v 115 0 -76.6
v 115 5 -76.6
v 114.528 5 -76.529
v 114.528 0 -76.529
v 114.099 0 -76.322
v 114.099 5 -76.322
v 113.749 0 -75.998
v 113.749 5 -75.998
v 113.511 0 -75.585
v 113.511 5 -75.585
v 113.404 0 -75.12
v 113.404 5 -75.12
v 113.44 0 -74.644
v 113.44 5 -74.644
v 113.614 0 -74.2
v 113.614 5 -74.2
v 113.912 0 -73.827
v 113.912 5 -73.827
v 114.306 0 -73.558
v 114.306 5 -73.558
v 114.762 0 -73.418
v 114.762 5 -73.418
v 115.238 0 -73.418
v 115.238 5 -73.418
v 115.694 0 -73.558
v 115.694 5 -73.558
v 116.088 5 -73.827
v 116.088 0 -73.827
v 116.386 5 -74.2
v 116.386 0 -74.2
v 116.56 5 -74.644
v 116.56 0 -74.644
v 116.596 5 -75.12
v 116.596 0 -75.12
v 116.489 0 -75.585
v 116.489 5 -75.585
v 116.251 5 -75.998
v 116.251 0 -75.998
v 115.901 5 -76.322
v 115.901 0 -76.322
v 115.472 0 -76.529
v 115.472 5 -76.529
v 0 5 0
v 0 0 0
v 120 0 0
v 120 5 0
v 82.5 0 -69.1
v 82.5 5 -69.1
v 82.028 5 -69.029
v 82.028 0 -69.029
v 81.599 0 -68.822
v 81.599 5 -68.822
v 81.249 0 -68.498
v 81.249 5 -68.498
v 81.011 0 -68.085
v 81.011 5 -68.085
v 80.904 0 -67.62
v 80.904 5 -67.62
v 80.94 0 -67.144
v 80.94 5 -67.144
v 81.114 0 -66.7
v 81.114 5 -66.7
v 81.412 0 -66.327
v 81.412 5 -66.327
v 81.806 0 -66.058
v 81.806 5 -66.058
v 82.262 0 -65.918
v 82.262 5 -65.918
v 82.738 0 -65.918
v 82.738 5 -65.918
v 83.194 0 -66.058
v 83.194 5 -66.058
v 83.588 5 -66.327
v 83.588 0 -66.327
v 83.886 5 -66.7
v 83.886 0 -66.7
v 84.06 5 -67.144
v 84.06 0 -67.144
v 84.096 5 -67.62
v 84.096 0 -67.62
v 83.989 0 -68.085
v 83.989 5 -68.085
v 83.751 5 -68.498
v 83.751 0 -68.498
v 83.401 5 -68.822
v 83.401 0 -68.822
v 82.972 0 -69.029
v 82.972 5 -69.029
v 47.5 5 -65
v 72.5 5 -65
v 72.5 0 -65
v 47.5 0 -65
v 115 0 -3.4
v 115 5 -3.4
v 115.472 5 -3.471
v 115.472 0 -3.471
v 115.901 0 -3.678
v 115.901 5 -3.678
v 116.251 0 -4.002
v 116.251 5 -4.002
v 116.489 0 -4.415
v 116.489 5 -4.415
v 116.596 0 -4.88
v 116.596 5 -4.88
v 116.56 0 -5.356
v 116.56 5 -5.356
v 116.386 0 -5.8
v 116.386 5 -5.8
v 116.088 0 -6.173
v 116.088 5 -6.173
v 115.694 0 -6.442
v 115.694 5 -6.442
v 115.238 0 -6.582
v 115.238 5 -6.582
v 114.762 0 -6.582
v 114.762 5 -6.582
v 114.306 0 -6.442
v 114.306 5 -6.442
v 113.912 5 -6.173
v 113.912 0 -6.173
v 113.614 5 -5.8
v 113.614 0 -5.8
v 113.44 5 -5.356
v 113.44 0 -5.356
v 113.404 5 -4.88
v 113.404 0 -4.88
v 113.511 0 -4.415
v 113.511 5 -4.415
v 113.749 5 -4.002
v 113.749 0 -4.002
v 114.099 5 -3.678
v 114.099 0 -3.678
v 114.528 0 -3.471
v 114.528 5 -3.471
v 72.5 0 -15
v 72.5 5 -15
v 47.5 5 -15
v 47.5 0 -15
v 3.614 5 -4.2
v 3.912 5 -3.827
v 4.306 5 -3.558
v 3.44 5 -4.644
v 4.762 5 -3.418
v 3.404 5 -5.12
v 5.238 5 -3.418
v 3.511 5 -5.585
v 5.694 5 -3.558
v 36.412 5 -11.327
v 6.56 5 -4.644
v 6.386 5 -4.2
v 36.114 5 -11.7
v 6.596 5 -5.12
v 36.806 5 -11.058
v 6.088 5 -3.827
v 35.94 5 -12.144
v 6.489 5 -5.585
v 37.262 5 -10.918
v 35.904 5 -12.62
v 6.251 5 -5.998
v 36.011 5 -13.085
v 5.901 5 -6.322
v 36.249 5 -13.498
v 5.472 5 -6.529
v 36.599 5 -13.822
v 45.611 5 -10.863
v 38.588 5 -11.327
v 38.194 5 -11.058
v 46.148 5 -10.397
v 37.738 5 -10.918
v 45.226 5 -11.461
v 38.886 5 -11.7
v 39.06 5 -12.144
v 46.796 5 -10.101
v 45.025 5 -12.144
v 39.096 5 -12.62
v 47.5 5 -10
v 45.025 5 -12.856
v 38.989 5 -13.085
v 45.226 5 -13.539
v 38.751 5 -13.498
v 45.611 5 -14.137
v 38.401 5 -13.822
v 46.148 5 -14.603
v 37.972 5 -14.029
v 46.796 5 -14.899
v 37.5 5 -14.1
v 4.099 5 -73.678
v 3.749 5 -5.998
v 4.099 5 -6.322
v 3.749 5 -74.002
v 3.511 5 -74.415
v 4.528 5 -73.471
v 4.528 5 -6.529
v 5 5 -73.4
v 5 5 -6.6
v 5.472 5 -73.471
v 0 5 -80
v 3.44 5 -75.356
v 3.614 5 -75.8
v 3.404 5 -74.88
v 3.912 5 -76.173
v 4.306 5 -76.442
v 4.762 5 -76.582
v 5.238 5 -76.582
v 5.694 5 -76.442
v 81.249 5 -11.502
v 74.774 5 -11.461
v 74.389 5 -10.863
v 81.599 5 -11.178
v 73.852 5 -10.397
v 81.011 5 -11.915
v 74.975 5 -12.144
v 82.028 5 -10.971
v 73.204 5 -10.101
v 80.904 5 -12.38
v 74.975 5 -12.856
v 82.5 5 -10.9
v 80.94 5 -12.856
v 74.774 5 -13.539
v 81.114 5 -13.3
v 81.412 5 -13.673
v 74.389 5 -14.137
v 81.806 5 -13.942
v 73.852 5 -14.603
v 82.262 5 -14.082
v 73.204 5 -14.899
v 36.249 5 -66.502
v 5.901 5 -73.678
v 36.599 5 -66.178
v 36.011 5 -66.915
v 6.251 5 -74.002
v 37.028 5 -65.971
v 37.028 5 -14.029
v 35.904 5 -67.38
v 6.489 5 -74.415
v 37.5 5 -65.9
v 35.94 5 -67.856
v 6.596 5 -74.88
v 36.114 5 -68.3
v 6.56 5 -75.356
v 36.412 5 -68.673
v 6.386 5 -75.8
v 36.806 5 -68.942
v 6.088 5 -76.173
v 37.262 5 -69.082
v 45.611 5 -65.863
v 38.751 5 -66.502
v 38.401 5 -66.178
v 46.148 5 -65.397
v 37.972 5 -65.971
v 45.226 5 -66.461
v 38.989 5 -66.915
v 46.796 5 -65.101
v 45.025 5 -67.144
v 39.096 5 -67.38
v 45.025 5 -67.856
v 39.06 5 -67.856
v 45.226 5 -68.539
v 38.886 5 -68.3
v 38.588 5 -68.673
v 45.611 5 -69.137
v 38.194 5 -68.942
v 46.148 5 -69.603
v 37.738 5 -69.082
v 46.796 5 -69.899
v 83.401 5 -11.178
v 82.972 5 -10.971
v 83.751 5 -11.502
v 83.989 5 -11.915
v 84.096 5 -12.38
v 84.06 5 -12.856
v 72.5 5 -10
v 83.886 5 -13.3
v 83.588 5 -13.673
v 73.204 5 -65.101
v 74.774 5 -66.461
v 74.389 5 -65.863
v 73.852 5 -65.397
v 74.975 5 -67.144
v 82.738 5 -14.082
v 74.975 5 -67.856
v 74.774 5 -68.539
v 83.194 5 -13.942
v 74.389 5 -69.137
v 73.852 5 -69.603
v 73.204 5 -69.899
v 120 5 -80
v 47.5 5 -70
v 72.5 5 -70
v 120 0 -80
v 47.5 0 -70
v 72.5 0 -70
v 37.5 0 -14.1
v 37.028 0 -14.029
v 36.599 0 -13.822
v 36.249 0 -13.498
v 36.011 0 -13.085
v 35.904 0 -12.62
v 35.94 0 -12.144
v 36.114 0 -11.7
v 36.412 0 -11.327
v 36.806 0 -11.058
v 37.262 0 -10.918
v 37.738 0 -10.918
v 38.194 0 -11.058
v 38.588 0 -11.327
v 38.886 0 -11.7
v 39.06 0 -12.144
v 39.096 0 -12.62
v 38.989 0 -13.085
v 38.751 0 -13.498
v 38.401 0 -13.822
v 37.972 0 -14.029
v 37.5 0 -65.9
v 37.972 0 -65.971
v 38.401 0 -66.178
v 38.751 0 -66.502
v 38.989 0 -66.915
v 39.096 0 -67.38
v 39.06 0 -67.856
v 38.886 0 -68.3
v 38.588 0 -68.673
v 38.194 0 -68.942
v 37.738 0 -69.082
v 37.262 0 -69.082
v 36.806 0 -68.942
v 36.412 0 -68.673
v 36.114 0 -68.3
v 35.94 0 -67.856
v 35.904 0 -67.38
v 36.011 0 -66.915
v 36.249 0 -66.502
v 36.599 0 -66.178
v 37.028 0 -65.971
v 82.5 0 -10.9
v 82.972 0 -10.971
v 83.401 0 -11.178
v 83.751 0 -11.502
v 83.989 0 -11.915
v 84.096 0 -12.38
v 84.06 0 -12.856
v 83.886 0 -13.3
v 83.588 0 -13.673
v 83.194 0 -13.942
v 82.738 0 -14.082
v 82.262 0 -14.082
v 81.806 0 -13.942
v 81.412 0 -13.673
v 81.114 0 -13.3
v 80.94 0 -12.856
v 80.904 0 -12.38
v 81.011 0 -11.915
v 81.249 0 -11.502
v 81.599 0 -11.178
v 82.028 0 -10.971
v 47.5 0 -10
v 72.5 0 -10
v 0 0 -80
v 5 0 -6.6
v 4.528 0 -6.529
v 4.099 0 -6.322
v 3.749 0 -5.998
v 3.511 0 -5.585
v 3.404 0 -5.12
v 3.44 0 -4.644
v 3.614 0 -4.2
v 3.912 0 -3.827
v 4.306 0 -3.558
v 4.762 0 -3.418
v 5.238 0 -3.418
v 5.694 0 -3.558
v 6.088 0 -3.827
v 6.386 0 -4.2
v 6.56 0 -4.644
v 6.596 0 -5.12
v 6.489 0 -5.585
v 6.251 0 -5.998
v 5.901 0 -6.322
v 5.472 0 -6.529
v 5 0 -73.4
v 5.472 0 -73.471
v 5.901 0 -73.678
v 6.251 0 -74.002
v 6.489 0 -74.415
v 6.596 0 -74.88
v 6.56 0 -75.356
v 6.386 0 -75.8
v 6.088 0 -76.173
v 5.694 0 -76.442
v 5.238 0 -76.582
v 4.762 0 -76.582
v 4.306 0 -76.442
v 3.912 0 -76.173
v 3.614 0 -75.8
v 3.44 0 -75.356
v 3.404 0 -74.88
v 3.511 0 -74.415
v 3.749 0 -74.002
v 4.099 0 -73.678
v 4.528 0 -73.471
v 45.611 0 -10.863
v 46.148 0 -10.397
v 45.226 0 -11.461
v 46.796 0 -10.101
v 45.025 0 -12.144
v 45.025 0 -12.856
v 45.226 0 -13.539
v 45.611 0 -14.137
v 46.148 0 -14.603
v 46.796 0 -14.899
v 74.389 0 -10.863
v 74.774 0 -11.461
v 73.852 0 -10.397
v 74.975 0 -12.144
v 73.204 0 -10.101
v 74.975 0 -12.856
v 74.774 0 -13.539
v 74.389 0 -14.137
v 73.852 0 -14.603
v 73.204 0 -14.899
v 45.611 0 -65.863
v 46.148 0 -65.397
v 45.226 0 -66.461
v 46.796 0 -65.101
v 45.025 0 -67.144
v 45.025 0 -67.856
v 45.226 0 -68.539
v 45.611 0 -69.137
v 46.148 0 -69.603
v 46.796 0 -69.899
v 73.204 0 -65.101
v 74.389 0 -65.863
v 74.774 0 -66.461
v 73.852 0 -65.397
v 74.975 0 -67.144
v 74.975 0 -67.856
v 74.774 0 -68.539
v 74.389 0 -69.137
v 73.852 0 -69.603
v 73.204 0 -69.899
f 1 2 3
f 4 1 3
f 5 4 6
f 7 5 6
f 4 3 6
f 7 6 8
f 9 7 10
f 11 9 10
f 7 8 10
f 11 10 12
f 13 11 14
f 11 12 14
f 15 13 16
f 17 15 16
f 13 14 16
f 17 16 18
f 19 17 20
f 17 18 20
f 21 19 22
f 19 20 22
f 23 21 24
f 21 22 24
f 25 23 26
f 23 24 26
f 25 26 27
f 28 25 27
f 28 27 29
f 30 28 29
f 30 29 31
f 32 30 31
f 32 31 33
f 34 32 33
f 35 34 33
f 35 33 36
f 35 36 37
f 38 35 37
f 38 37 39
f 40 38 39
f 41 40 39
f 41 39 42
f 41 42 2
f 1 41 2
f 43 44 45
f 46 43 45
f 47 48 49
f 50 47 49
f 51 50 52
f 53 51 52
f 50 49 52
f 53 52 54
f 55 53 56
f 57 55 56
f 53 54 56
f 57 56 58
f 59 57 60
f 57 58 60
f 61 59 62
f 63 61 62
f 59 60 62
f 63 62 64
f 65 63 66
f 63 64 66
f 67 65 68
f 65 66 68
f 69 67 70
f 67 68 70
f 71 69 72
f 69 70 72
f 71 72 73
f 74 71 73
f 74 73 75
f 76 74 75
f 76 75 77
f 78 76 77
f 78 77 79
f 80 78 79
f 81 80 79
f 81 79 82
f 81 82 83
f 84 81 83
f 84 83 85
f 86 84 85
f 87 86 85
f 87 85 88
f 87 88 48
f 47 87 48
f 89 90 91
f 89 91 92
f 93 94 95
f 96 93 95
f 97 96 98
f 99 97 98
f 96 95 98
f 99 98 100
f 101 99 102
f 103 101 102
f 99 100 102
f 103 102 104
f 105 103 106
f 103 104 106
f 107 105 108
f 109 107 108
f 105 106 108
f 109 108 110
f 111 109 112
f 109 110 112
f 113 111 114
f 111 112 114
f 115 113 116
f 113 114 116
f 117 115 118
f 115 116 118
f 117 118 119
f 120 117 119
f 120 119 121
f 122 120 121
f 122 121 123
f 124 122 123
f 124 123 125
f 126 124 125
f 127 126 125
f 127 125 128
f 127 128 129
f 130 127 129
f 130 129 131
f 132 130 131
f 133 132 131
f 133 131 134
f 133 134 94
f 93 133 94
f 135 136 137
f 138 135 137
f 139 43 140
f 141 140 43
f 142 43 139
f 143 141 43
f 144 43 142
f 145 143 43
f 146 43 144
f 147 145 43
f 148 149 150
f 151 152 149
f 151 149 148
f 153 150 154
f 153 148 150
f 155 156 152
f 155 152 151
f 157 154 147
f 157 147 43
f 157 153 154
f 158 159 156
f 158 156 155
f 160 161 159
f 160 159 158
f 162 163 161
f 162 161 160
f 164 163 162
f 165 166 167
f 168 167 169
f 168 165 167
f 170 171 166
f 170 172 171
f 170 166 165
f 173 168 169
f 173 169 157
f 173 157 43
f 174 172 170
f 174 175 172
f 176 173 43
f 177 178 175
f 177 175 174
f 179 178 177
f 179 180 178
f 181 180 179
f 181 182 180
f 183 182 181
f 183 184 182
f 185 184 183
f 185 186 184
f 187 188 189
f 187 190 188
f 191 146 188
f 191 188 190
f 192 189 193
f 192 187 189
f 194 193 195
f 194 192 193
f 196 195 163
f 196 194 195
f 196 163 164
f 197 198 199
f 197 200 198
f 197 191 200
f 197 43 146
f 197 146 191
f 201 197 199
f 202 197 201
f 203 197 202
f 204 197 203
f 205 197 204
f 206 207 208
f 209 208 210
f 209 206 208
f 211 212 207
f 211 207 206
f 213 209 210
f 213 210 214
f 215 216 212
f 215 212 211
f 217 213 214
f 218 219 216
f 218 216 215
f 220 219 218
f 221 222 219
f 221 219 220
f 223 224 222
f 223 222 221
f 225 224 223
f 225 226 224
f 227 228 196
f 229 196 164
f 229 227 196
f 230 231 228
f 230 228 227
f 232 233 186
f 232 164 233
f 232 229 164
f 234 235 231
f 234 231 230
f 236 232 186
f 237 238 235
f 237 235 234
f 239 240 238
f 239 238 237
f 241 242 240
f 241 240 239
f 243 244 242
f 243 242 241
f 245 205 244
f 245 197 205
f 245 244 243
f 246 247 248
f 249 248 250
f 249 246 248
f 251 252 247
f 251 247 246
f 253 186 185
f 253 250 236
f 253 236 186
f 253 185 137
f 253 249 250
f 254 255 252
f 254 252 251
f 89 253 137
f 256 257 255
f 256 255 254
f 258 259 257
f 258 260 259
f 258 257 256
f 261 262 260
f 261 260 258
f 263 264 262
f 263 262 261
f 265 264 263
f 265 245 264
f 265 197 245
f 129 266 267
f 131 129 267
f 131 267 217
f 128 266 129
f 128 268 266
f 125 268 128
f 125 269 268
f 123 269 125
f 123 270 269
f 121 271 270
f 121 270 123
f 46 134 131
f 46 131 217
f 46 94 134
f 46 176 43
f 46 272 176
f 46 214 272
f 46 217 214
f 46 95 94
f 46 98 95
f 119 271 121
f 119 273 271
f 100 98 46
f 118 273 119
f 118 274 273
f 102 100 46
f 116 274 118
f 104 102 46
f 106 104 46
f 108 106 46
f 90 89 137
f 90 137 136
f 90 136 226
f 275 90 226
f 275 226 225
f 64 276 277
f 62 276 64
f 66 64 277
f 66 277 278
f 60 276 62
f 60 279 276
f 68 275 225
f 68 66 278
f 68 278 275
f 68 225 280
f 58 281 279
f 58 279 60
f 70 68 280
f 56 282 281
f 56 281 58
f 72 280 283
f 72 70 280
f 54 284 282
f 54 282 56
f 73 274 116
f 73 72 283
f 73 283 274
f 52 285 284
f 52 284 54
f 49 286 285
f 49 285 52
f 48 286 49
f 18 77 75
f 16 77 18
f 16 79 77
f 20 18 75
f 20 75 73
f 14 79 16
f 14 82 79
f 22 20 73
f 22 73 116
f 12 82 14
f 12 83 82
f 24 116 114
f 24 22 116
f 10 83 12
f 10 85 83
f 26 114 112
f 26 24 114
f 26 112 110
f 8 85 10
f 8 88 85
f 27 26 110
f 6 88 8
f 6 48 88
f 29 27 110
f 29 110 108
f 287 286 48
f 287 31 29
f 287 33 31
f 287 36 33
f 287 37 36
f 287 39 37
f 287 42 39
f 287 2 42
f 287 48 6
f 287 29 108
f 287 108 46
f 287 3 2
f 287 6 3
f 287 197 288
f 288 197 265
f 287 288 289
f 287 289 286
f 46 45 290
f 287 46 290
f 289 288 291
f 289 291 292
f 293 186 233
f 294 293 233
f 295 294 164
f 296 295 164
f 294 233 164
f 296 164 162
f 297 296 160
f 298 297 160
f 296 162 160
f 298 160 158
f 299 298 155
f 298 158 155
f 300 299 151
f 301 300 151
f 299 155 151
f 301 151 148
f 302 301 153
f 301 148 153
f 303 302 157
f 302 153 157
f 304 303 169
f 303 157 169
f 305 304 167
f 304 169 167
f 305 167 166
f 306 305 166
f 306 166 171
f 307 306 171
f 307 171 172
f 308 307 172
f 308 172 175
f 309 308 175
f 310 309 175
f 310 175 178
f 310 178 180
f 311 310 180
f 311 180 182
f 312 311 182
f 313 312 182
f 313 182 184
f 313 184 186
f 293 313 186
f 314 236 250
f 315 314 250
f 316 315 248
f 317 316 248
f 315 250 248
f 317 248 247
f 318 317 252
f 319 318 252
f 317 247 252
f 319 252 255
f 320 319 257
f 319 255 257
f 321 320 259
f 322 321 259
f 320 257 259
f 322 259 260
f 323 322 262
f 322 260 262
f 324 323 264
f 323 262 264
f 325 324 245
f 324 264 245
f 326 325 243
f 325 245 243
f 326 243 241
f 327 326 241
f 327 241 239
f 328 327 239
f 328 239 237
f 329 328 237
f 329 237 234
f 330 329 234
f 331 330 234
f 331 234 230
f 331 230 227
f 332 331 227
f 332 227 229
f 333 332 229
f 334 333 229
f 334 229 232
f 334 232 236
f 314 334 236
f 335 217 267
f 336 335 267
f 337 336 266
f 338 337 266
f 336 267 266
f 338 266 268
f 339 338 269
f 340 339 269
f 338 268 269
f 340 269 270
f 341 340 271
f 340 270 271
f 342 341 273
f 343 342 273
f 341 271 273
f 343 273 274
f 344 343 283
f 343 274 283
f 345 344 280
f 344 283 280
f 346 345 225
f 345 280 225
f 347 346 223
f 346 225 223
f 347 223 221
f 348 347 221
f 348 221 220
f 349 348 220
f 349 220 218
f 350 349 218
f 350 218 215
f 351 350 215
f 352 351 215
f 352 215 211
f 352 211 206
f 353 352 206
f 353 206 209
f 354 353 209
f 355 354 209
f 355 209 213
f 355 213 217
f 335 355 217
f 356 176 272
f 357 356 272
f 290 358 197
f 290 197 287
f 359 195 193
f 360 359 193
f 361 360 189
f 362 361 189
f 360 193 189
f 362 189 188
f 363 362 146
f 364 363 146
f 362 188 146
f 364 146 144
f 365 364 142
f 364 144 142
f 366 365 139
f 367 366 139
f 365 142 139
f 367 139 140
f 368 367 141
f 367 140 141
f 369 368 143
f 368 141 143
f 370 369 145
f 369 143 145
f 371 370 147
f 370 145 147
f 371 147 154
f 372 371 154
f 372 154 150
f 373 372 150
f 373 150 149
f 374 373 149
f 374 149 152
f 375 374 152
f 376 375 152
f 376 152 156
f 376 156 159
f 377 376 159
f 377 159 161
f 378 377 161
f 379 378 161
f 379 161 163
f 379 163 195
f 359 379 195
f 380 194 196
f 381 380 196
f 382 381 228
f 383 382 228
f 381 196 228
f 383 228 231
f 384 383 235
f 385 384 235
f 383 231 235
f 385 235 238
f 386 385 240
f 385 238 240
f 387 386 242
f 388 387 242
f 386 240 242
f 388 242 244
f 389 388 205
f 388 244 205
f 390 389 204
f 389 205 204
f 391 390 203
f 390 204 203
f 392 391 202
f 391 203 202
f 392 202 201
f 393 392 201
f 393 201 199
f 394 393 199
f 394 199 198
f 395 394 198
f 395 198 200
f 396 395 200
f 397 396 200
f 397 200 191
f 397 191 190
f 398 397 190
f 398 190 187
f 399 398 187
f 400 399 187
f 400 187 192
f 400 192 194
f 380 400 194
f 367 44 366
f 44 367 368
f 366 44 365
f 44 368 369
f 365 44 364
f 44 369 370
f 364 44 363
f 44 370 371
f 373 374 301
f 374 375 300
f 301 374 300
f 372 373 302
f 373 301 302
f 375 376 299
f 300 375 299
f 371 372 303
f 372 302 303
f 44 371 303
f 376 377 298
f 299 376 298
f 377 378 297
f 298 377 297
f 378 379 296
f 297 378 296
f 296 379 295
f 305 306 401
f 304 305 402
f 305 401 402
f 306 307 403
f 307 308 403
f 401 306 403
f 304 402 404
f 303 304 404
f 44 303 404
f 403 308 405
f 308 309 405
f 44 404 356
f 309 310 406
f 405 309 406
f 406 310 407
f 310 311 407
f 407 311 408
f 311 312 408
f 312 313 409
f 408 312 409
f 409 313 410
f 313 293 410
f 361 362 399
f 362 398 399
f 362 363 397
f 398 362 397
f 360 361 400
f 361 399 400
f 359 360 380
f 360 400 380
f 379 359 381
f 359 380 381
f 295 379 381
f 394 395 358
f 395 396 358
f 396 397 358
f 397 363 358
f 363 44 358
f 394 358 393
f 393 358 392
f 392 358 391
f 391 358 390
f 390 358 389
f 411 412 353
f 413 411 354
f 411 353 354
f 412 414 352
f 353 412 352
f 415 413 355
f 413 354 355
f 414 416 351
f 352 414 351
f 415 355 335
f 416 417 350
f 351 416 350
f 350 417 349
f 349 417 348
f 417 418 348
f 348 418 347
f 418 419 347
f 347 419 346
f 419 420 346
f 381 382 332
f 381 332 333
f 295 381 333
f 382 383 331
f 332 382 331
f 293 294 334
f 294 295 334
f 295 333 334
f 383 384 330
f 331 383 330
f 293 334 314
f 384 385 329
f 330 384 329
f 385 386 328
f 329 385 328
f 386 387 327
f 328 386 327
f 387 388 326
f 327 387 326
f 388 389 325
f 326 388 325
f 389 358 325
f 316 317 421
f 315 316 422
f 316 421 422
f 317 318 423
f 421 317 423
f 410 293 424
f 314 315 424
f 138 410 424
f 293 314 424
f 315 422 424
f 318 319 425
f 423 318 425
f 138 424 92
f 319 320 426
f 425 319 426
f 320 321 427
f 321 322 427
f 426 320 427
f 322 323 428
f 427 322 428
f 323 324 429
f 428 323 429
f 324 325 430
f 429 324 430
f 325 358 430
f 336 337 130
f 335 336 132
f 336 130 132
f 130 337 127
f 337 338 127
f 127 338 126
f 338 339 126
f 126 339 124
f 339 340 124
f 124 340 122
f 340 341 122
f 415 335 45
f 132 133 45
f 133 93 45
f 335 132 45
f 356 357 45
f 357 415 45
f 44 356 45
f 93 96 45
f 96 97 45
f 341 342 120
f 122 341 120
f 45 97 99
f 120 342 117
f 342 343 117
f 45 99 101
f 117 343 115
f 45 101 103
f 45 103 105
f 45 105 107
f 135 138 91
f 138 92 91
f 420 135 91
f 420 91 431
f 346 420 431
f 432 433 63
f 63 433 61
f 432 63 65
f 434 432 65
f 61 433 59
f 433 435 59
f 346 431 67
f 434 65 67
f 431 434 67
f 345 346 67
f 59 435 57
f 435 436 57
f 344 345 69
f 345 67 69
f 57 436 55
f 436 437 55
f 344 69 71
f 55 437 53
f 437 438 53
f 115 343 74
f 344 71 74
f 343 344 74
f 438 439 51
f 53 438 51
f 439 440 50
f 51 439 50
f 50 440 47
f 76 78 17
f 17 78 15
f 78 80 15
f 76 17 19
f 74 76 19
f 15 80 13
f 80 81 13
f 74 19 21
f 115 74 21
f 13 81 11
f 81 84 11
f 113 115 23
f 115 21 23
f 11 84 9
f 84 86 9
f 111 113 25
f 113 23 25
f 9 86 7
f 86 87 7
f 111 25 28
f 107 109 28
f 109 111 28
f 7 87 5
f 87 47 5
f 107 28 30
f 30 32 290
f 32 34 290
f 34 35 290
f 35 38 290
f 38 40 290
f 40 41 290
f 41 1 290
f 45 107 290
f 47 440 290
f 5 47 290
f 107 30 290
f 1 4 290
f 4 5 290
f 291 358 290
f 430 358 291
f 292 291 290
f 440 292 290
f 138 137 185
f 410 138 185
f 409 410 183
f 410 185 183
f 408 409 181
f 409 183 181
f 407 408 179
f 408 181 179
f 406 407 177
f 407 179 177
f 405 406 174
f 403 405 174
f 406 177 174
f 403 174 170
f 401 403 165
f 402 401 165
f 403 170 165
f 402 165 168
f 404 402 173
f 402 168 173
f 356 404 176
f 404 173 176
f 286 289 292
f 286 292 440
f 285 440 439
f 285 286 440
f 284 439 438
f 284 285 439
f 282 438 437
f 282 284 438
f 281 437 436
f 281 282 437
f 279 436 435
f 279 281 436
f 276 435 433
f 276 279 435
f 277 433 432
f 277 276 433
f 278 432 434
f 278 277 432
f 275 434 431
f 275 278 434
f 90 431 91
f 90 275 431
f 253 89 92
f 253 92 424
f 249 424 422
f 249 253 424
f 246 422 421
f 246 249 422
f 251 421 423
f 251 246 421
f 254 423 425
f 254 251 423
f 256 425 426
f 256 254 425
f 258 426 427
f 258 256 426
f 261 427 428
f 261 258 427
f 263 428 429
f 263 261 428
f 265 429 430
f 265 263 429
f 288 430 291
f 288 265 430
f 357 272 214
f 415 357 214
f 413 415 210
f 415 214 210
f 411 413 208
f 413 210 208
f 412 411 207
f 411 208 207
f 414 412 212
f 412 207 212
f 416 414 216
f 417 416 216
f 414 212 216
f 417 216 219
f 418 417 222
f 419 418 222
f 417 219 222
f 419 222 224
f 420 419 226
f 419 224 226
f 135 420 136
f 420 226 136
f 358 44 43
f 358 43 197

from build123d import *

# Parameters (mm, degrees)
ESQUISSE1_W             = 120
ESQUISSE1_H             = 80
BOSS_EXTRU_1_DEPTH      = 5
ESQUISSE2_R             = 1.6
ENL_V_MAT_EXTRU_1_DEPTH = 145.308696897


with BuildPart() as part:
    # Esquisse1 → Boss.-Extru.1 (new body)
    with BuildSketch(Plane(origin=(0, 0, 0), x_dir=(1, 0, 0), z_dir=(0, 1, 0))):
        with Locations((60, 40)):
            Rectangle(ESQUISSE1_W, ESQUISSE1_H)
    extrude(amount=BOSS_EXTRU_1_DEPTH)

    # Esquisse2 → Enlèv. mat.-Extru.1 (cut, through all)
    with BuildSketch(Plane(origin=(0, 5, 0), x_dir=(1, 0, 0), z_dir=(0, 1, 0))):
        with Locations(Location((37.5, 67.5, 0), (0, 0, 270))):
            Circle(ESQUISSE2_R)
        with Locations(Location((82.5, 67.5, 0), (0, 0, 90))):
            Circle(ESQUISSE2_R)
        with Locations(Location((82.5, 12.5, 0), (0, 0, 270))):
            Circle(ESQUISSE2_R)
        with Locations(Location((37.5, 12.5, 0), (0, 0, 90))):
            Circle(ESQUISSE2_R)
        with Locations(Location((5, 75, 0), (0, 0, 270))):
            Circle(ESQUISSE2_R)
        with Locations(Location((115, 75, 0), (0, 0, 90))):
            Circle(ESQUISSE2_R)
        with Locations(Location((115, 5, 0), (0, 0, 270))):
            Circle(ESQUISSE2_R)
        with Locations(Location((5, 5, 0), (0, 0, 90))):
            Circle(ESQUISSE2_R)
        with BuildLine():
            Line((47.5, 70), (72.5, 70))
            ThreePointArc((72.5, 70), (75, 67.5), (72.5, 65))
            Line((72.5, 65), (47.5, 65))
            ThreePointArc((47.5, 65), (45, 67.5), (47.5, 70))
        make_face()
        with BuildLine():
            Line((47.5, 10), (72.5, 10))
            ThreePointArc((72.5, 10), (75, 12.5), (72.5, 15))
            Line((72.5, 15), (47.5, 15))
            ThreePointArc((47.5, 15), (45, 12.5), (47.5, 10))
        make_face()
    extrude(amount=-ENL_V_MAT_EXTRU_1_DEPTH, mode=Mode.SUBTRACT)


solid = part.part
